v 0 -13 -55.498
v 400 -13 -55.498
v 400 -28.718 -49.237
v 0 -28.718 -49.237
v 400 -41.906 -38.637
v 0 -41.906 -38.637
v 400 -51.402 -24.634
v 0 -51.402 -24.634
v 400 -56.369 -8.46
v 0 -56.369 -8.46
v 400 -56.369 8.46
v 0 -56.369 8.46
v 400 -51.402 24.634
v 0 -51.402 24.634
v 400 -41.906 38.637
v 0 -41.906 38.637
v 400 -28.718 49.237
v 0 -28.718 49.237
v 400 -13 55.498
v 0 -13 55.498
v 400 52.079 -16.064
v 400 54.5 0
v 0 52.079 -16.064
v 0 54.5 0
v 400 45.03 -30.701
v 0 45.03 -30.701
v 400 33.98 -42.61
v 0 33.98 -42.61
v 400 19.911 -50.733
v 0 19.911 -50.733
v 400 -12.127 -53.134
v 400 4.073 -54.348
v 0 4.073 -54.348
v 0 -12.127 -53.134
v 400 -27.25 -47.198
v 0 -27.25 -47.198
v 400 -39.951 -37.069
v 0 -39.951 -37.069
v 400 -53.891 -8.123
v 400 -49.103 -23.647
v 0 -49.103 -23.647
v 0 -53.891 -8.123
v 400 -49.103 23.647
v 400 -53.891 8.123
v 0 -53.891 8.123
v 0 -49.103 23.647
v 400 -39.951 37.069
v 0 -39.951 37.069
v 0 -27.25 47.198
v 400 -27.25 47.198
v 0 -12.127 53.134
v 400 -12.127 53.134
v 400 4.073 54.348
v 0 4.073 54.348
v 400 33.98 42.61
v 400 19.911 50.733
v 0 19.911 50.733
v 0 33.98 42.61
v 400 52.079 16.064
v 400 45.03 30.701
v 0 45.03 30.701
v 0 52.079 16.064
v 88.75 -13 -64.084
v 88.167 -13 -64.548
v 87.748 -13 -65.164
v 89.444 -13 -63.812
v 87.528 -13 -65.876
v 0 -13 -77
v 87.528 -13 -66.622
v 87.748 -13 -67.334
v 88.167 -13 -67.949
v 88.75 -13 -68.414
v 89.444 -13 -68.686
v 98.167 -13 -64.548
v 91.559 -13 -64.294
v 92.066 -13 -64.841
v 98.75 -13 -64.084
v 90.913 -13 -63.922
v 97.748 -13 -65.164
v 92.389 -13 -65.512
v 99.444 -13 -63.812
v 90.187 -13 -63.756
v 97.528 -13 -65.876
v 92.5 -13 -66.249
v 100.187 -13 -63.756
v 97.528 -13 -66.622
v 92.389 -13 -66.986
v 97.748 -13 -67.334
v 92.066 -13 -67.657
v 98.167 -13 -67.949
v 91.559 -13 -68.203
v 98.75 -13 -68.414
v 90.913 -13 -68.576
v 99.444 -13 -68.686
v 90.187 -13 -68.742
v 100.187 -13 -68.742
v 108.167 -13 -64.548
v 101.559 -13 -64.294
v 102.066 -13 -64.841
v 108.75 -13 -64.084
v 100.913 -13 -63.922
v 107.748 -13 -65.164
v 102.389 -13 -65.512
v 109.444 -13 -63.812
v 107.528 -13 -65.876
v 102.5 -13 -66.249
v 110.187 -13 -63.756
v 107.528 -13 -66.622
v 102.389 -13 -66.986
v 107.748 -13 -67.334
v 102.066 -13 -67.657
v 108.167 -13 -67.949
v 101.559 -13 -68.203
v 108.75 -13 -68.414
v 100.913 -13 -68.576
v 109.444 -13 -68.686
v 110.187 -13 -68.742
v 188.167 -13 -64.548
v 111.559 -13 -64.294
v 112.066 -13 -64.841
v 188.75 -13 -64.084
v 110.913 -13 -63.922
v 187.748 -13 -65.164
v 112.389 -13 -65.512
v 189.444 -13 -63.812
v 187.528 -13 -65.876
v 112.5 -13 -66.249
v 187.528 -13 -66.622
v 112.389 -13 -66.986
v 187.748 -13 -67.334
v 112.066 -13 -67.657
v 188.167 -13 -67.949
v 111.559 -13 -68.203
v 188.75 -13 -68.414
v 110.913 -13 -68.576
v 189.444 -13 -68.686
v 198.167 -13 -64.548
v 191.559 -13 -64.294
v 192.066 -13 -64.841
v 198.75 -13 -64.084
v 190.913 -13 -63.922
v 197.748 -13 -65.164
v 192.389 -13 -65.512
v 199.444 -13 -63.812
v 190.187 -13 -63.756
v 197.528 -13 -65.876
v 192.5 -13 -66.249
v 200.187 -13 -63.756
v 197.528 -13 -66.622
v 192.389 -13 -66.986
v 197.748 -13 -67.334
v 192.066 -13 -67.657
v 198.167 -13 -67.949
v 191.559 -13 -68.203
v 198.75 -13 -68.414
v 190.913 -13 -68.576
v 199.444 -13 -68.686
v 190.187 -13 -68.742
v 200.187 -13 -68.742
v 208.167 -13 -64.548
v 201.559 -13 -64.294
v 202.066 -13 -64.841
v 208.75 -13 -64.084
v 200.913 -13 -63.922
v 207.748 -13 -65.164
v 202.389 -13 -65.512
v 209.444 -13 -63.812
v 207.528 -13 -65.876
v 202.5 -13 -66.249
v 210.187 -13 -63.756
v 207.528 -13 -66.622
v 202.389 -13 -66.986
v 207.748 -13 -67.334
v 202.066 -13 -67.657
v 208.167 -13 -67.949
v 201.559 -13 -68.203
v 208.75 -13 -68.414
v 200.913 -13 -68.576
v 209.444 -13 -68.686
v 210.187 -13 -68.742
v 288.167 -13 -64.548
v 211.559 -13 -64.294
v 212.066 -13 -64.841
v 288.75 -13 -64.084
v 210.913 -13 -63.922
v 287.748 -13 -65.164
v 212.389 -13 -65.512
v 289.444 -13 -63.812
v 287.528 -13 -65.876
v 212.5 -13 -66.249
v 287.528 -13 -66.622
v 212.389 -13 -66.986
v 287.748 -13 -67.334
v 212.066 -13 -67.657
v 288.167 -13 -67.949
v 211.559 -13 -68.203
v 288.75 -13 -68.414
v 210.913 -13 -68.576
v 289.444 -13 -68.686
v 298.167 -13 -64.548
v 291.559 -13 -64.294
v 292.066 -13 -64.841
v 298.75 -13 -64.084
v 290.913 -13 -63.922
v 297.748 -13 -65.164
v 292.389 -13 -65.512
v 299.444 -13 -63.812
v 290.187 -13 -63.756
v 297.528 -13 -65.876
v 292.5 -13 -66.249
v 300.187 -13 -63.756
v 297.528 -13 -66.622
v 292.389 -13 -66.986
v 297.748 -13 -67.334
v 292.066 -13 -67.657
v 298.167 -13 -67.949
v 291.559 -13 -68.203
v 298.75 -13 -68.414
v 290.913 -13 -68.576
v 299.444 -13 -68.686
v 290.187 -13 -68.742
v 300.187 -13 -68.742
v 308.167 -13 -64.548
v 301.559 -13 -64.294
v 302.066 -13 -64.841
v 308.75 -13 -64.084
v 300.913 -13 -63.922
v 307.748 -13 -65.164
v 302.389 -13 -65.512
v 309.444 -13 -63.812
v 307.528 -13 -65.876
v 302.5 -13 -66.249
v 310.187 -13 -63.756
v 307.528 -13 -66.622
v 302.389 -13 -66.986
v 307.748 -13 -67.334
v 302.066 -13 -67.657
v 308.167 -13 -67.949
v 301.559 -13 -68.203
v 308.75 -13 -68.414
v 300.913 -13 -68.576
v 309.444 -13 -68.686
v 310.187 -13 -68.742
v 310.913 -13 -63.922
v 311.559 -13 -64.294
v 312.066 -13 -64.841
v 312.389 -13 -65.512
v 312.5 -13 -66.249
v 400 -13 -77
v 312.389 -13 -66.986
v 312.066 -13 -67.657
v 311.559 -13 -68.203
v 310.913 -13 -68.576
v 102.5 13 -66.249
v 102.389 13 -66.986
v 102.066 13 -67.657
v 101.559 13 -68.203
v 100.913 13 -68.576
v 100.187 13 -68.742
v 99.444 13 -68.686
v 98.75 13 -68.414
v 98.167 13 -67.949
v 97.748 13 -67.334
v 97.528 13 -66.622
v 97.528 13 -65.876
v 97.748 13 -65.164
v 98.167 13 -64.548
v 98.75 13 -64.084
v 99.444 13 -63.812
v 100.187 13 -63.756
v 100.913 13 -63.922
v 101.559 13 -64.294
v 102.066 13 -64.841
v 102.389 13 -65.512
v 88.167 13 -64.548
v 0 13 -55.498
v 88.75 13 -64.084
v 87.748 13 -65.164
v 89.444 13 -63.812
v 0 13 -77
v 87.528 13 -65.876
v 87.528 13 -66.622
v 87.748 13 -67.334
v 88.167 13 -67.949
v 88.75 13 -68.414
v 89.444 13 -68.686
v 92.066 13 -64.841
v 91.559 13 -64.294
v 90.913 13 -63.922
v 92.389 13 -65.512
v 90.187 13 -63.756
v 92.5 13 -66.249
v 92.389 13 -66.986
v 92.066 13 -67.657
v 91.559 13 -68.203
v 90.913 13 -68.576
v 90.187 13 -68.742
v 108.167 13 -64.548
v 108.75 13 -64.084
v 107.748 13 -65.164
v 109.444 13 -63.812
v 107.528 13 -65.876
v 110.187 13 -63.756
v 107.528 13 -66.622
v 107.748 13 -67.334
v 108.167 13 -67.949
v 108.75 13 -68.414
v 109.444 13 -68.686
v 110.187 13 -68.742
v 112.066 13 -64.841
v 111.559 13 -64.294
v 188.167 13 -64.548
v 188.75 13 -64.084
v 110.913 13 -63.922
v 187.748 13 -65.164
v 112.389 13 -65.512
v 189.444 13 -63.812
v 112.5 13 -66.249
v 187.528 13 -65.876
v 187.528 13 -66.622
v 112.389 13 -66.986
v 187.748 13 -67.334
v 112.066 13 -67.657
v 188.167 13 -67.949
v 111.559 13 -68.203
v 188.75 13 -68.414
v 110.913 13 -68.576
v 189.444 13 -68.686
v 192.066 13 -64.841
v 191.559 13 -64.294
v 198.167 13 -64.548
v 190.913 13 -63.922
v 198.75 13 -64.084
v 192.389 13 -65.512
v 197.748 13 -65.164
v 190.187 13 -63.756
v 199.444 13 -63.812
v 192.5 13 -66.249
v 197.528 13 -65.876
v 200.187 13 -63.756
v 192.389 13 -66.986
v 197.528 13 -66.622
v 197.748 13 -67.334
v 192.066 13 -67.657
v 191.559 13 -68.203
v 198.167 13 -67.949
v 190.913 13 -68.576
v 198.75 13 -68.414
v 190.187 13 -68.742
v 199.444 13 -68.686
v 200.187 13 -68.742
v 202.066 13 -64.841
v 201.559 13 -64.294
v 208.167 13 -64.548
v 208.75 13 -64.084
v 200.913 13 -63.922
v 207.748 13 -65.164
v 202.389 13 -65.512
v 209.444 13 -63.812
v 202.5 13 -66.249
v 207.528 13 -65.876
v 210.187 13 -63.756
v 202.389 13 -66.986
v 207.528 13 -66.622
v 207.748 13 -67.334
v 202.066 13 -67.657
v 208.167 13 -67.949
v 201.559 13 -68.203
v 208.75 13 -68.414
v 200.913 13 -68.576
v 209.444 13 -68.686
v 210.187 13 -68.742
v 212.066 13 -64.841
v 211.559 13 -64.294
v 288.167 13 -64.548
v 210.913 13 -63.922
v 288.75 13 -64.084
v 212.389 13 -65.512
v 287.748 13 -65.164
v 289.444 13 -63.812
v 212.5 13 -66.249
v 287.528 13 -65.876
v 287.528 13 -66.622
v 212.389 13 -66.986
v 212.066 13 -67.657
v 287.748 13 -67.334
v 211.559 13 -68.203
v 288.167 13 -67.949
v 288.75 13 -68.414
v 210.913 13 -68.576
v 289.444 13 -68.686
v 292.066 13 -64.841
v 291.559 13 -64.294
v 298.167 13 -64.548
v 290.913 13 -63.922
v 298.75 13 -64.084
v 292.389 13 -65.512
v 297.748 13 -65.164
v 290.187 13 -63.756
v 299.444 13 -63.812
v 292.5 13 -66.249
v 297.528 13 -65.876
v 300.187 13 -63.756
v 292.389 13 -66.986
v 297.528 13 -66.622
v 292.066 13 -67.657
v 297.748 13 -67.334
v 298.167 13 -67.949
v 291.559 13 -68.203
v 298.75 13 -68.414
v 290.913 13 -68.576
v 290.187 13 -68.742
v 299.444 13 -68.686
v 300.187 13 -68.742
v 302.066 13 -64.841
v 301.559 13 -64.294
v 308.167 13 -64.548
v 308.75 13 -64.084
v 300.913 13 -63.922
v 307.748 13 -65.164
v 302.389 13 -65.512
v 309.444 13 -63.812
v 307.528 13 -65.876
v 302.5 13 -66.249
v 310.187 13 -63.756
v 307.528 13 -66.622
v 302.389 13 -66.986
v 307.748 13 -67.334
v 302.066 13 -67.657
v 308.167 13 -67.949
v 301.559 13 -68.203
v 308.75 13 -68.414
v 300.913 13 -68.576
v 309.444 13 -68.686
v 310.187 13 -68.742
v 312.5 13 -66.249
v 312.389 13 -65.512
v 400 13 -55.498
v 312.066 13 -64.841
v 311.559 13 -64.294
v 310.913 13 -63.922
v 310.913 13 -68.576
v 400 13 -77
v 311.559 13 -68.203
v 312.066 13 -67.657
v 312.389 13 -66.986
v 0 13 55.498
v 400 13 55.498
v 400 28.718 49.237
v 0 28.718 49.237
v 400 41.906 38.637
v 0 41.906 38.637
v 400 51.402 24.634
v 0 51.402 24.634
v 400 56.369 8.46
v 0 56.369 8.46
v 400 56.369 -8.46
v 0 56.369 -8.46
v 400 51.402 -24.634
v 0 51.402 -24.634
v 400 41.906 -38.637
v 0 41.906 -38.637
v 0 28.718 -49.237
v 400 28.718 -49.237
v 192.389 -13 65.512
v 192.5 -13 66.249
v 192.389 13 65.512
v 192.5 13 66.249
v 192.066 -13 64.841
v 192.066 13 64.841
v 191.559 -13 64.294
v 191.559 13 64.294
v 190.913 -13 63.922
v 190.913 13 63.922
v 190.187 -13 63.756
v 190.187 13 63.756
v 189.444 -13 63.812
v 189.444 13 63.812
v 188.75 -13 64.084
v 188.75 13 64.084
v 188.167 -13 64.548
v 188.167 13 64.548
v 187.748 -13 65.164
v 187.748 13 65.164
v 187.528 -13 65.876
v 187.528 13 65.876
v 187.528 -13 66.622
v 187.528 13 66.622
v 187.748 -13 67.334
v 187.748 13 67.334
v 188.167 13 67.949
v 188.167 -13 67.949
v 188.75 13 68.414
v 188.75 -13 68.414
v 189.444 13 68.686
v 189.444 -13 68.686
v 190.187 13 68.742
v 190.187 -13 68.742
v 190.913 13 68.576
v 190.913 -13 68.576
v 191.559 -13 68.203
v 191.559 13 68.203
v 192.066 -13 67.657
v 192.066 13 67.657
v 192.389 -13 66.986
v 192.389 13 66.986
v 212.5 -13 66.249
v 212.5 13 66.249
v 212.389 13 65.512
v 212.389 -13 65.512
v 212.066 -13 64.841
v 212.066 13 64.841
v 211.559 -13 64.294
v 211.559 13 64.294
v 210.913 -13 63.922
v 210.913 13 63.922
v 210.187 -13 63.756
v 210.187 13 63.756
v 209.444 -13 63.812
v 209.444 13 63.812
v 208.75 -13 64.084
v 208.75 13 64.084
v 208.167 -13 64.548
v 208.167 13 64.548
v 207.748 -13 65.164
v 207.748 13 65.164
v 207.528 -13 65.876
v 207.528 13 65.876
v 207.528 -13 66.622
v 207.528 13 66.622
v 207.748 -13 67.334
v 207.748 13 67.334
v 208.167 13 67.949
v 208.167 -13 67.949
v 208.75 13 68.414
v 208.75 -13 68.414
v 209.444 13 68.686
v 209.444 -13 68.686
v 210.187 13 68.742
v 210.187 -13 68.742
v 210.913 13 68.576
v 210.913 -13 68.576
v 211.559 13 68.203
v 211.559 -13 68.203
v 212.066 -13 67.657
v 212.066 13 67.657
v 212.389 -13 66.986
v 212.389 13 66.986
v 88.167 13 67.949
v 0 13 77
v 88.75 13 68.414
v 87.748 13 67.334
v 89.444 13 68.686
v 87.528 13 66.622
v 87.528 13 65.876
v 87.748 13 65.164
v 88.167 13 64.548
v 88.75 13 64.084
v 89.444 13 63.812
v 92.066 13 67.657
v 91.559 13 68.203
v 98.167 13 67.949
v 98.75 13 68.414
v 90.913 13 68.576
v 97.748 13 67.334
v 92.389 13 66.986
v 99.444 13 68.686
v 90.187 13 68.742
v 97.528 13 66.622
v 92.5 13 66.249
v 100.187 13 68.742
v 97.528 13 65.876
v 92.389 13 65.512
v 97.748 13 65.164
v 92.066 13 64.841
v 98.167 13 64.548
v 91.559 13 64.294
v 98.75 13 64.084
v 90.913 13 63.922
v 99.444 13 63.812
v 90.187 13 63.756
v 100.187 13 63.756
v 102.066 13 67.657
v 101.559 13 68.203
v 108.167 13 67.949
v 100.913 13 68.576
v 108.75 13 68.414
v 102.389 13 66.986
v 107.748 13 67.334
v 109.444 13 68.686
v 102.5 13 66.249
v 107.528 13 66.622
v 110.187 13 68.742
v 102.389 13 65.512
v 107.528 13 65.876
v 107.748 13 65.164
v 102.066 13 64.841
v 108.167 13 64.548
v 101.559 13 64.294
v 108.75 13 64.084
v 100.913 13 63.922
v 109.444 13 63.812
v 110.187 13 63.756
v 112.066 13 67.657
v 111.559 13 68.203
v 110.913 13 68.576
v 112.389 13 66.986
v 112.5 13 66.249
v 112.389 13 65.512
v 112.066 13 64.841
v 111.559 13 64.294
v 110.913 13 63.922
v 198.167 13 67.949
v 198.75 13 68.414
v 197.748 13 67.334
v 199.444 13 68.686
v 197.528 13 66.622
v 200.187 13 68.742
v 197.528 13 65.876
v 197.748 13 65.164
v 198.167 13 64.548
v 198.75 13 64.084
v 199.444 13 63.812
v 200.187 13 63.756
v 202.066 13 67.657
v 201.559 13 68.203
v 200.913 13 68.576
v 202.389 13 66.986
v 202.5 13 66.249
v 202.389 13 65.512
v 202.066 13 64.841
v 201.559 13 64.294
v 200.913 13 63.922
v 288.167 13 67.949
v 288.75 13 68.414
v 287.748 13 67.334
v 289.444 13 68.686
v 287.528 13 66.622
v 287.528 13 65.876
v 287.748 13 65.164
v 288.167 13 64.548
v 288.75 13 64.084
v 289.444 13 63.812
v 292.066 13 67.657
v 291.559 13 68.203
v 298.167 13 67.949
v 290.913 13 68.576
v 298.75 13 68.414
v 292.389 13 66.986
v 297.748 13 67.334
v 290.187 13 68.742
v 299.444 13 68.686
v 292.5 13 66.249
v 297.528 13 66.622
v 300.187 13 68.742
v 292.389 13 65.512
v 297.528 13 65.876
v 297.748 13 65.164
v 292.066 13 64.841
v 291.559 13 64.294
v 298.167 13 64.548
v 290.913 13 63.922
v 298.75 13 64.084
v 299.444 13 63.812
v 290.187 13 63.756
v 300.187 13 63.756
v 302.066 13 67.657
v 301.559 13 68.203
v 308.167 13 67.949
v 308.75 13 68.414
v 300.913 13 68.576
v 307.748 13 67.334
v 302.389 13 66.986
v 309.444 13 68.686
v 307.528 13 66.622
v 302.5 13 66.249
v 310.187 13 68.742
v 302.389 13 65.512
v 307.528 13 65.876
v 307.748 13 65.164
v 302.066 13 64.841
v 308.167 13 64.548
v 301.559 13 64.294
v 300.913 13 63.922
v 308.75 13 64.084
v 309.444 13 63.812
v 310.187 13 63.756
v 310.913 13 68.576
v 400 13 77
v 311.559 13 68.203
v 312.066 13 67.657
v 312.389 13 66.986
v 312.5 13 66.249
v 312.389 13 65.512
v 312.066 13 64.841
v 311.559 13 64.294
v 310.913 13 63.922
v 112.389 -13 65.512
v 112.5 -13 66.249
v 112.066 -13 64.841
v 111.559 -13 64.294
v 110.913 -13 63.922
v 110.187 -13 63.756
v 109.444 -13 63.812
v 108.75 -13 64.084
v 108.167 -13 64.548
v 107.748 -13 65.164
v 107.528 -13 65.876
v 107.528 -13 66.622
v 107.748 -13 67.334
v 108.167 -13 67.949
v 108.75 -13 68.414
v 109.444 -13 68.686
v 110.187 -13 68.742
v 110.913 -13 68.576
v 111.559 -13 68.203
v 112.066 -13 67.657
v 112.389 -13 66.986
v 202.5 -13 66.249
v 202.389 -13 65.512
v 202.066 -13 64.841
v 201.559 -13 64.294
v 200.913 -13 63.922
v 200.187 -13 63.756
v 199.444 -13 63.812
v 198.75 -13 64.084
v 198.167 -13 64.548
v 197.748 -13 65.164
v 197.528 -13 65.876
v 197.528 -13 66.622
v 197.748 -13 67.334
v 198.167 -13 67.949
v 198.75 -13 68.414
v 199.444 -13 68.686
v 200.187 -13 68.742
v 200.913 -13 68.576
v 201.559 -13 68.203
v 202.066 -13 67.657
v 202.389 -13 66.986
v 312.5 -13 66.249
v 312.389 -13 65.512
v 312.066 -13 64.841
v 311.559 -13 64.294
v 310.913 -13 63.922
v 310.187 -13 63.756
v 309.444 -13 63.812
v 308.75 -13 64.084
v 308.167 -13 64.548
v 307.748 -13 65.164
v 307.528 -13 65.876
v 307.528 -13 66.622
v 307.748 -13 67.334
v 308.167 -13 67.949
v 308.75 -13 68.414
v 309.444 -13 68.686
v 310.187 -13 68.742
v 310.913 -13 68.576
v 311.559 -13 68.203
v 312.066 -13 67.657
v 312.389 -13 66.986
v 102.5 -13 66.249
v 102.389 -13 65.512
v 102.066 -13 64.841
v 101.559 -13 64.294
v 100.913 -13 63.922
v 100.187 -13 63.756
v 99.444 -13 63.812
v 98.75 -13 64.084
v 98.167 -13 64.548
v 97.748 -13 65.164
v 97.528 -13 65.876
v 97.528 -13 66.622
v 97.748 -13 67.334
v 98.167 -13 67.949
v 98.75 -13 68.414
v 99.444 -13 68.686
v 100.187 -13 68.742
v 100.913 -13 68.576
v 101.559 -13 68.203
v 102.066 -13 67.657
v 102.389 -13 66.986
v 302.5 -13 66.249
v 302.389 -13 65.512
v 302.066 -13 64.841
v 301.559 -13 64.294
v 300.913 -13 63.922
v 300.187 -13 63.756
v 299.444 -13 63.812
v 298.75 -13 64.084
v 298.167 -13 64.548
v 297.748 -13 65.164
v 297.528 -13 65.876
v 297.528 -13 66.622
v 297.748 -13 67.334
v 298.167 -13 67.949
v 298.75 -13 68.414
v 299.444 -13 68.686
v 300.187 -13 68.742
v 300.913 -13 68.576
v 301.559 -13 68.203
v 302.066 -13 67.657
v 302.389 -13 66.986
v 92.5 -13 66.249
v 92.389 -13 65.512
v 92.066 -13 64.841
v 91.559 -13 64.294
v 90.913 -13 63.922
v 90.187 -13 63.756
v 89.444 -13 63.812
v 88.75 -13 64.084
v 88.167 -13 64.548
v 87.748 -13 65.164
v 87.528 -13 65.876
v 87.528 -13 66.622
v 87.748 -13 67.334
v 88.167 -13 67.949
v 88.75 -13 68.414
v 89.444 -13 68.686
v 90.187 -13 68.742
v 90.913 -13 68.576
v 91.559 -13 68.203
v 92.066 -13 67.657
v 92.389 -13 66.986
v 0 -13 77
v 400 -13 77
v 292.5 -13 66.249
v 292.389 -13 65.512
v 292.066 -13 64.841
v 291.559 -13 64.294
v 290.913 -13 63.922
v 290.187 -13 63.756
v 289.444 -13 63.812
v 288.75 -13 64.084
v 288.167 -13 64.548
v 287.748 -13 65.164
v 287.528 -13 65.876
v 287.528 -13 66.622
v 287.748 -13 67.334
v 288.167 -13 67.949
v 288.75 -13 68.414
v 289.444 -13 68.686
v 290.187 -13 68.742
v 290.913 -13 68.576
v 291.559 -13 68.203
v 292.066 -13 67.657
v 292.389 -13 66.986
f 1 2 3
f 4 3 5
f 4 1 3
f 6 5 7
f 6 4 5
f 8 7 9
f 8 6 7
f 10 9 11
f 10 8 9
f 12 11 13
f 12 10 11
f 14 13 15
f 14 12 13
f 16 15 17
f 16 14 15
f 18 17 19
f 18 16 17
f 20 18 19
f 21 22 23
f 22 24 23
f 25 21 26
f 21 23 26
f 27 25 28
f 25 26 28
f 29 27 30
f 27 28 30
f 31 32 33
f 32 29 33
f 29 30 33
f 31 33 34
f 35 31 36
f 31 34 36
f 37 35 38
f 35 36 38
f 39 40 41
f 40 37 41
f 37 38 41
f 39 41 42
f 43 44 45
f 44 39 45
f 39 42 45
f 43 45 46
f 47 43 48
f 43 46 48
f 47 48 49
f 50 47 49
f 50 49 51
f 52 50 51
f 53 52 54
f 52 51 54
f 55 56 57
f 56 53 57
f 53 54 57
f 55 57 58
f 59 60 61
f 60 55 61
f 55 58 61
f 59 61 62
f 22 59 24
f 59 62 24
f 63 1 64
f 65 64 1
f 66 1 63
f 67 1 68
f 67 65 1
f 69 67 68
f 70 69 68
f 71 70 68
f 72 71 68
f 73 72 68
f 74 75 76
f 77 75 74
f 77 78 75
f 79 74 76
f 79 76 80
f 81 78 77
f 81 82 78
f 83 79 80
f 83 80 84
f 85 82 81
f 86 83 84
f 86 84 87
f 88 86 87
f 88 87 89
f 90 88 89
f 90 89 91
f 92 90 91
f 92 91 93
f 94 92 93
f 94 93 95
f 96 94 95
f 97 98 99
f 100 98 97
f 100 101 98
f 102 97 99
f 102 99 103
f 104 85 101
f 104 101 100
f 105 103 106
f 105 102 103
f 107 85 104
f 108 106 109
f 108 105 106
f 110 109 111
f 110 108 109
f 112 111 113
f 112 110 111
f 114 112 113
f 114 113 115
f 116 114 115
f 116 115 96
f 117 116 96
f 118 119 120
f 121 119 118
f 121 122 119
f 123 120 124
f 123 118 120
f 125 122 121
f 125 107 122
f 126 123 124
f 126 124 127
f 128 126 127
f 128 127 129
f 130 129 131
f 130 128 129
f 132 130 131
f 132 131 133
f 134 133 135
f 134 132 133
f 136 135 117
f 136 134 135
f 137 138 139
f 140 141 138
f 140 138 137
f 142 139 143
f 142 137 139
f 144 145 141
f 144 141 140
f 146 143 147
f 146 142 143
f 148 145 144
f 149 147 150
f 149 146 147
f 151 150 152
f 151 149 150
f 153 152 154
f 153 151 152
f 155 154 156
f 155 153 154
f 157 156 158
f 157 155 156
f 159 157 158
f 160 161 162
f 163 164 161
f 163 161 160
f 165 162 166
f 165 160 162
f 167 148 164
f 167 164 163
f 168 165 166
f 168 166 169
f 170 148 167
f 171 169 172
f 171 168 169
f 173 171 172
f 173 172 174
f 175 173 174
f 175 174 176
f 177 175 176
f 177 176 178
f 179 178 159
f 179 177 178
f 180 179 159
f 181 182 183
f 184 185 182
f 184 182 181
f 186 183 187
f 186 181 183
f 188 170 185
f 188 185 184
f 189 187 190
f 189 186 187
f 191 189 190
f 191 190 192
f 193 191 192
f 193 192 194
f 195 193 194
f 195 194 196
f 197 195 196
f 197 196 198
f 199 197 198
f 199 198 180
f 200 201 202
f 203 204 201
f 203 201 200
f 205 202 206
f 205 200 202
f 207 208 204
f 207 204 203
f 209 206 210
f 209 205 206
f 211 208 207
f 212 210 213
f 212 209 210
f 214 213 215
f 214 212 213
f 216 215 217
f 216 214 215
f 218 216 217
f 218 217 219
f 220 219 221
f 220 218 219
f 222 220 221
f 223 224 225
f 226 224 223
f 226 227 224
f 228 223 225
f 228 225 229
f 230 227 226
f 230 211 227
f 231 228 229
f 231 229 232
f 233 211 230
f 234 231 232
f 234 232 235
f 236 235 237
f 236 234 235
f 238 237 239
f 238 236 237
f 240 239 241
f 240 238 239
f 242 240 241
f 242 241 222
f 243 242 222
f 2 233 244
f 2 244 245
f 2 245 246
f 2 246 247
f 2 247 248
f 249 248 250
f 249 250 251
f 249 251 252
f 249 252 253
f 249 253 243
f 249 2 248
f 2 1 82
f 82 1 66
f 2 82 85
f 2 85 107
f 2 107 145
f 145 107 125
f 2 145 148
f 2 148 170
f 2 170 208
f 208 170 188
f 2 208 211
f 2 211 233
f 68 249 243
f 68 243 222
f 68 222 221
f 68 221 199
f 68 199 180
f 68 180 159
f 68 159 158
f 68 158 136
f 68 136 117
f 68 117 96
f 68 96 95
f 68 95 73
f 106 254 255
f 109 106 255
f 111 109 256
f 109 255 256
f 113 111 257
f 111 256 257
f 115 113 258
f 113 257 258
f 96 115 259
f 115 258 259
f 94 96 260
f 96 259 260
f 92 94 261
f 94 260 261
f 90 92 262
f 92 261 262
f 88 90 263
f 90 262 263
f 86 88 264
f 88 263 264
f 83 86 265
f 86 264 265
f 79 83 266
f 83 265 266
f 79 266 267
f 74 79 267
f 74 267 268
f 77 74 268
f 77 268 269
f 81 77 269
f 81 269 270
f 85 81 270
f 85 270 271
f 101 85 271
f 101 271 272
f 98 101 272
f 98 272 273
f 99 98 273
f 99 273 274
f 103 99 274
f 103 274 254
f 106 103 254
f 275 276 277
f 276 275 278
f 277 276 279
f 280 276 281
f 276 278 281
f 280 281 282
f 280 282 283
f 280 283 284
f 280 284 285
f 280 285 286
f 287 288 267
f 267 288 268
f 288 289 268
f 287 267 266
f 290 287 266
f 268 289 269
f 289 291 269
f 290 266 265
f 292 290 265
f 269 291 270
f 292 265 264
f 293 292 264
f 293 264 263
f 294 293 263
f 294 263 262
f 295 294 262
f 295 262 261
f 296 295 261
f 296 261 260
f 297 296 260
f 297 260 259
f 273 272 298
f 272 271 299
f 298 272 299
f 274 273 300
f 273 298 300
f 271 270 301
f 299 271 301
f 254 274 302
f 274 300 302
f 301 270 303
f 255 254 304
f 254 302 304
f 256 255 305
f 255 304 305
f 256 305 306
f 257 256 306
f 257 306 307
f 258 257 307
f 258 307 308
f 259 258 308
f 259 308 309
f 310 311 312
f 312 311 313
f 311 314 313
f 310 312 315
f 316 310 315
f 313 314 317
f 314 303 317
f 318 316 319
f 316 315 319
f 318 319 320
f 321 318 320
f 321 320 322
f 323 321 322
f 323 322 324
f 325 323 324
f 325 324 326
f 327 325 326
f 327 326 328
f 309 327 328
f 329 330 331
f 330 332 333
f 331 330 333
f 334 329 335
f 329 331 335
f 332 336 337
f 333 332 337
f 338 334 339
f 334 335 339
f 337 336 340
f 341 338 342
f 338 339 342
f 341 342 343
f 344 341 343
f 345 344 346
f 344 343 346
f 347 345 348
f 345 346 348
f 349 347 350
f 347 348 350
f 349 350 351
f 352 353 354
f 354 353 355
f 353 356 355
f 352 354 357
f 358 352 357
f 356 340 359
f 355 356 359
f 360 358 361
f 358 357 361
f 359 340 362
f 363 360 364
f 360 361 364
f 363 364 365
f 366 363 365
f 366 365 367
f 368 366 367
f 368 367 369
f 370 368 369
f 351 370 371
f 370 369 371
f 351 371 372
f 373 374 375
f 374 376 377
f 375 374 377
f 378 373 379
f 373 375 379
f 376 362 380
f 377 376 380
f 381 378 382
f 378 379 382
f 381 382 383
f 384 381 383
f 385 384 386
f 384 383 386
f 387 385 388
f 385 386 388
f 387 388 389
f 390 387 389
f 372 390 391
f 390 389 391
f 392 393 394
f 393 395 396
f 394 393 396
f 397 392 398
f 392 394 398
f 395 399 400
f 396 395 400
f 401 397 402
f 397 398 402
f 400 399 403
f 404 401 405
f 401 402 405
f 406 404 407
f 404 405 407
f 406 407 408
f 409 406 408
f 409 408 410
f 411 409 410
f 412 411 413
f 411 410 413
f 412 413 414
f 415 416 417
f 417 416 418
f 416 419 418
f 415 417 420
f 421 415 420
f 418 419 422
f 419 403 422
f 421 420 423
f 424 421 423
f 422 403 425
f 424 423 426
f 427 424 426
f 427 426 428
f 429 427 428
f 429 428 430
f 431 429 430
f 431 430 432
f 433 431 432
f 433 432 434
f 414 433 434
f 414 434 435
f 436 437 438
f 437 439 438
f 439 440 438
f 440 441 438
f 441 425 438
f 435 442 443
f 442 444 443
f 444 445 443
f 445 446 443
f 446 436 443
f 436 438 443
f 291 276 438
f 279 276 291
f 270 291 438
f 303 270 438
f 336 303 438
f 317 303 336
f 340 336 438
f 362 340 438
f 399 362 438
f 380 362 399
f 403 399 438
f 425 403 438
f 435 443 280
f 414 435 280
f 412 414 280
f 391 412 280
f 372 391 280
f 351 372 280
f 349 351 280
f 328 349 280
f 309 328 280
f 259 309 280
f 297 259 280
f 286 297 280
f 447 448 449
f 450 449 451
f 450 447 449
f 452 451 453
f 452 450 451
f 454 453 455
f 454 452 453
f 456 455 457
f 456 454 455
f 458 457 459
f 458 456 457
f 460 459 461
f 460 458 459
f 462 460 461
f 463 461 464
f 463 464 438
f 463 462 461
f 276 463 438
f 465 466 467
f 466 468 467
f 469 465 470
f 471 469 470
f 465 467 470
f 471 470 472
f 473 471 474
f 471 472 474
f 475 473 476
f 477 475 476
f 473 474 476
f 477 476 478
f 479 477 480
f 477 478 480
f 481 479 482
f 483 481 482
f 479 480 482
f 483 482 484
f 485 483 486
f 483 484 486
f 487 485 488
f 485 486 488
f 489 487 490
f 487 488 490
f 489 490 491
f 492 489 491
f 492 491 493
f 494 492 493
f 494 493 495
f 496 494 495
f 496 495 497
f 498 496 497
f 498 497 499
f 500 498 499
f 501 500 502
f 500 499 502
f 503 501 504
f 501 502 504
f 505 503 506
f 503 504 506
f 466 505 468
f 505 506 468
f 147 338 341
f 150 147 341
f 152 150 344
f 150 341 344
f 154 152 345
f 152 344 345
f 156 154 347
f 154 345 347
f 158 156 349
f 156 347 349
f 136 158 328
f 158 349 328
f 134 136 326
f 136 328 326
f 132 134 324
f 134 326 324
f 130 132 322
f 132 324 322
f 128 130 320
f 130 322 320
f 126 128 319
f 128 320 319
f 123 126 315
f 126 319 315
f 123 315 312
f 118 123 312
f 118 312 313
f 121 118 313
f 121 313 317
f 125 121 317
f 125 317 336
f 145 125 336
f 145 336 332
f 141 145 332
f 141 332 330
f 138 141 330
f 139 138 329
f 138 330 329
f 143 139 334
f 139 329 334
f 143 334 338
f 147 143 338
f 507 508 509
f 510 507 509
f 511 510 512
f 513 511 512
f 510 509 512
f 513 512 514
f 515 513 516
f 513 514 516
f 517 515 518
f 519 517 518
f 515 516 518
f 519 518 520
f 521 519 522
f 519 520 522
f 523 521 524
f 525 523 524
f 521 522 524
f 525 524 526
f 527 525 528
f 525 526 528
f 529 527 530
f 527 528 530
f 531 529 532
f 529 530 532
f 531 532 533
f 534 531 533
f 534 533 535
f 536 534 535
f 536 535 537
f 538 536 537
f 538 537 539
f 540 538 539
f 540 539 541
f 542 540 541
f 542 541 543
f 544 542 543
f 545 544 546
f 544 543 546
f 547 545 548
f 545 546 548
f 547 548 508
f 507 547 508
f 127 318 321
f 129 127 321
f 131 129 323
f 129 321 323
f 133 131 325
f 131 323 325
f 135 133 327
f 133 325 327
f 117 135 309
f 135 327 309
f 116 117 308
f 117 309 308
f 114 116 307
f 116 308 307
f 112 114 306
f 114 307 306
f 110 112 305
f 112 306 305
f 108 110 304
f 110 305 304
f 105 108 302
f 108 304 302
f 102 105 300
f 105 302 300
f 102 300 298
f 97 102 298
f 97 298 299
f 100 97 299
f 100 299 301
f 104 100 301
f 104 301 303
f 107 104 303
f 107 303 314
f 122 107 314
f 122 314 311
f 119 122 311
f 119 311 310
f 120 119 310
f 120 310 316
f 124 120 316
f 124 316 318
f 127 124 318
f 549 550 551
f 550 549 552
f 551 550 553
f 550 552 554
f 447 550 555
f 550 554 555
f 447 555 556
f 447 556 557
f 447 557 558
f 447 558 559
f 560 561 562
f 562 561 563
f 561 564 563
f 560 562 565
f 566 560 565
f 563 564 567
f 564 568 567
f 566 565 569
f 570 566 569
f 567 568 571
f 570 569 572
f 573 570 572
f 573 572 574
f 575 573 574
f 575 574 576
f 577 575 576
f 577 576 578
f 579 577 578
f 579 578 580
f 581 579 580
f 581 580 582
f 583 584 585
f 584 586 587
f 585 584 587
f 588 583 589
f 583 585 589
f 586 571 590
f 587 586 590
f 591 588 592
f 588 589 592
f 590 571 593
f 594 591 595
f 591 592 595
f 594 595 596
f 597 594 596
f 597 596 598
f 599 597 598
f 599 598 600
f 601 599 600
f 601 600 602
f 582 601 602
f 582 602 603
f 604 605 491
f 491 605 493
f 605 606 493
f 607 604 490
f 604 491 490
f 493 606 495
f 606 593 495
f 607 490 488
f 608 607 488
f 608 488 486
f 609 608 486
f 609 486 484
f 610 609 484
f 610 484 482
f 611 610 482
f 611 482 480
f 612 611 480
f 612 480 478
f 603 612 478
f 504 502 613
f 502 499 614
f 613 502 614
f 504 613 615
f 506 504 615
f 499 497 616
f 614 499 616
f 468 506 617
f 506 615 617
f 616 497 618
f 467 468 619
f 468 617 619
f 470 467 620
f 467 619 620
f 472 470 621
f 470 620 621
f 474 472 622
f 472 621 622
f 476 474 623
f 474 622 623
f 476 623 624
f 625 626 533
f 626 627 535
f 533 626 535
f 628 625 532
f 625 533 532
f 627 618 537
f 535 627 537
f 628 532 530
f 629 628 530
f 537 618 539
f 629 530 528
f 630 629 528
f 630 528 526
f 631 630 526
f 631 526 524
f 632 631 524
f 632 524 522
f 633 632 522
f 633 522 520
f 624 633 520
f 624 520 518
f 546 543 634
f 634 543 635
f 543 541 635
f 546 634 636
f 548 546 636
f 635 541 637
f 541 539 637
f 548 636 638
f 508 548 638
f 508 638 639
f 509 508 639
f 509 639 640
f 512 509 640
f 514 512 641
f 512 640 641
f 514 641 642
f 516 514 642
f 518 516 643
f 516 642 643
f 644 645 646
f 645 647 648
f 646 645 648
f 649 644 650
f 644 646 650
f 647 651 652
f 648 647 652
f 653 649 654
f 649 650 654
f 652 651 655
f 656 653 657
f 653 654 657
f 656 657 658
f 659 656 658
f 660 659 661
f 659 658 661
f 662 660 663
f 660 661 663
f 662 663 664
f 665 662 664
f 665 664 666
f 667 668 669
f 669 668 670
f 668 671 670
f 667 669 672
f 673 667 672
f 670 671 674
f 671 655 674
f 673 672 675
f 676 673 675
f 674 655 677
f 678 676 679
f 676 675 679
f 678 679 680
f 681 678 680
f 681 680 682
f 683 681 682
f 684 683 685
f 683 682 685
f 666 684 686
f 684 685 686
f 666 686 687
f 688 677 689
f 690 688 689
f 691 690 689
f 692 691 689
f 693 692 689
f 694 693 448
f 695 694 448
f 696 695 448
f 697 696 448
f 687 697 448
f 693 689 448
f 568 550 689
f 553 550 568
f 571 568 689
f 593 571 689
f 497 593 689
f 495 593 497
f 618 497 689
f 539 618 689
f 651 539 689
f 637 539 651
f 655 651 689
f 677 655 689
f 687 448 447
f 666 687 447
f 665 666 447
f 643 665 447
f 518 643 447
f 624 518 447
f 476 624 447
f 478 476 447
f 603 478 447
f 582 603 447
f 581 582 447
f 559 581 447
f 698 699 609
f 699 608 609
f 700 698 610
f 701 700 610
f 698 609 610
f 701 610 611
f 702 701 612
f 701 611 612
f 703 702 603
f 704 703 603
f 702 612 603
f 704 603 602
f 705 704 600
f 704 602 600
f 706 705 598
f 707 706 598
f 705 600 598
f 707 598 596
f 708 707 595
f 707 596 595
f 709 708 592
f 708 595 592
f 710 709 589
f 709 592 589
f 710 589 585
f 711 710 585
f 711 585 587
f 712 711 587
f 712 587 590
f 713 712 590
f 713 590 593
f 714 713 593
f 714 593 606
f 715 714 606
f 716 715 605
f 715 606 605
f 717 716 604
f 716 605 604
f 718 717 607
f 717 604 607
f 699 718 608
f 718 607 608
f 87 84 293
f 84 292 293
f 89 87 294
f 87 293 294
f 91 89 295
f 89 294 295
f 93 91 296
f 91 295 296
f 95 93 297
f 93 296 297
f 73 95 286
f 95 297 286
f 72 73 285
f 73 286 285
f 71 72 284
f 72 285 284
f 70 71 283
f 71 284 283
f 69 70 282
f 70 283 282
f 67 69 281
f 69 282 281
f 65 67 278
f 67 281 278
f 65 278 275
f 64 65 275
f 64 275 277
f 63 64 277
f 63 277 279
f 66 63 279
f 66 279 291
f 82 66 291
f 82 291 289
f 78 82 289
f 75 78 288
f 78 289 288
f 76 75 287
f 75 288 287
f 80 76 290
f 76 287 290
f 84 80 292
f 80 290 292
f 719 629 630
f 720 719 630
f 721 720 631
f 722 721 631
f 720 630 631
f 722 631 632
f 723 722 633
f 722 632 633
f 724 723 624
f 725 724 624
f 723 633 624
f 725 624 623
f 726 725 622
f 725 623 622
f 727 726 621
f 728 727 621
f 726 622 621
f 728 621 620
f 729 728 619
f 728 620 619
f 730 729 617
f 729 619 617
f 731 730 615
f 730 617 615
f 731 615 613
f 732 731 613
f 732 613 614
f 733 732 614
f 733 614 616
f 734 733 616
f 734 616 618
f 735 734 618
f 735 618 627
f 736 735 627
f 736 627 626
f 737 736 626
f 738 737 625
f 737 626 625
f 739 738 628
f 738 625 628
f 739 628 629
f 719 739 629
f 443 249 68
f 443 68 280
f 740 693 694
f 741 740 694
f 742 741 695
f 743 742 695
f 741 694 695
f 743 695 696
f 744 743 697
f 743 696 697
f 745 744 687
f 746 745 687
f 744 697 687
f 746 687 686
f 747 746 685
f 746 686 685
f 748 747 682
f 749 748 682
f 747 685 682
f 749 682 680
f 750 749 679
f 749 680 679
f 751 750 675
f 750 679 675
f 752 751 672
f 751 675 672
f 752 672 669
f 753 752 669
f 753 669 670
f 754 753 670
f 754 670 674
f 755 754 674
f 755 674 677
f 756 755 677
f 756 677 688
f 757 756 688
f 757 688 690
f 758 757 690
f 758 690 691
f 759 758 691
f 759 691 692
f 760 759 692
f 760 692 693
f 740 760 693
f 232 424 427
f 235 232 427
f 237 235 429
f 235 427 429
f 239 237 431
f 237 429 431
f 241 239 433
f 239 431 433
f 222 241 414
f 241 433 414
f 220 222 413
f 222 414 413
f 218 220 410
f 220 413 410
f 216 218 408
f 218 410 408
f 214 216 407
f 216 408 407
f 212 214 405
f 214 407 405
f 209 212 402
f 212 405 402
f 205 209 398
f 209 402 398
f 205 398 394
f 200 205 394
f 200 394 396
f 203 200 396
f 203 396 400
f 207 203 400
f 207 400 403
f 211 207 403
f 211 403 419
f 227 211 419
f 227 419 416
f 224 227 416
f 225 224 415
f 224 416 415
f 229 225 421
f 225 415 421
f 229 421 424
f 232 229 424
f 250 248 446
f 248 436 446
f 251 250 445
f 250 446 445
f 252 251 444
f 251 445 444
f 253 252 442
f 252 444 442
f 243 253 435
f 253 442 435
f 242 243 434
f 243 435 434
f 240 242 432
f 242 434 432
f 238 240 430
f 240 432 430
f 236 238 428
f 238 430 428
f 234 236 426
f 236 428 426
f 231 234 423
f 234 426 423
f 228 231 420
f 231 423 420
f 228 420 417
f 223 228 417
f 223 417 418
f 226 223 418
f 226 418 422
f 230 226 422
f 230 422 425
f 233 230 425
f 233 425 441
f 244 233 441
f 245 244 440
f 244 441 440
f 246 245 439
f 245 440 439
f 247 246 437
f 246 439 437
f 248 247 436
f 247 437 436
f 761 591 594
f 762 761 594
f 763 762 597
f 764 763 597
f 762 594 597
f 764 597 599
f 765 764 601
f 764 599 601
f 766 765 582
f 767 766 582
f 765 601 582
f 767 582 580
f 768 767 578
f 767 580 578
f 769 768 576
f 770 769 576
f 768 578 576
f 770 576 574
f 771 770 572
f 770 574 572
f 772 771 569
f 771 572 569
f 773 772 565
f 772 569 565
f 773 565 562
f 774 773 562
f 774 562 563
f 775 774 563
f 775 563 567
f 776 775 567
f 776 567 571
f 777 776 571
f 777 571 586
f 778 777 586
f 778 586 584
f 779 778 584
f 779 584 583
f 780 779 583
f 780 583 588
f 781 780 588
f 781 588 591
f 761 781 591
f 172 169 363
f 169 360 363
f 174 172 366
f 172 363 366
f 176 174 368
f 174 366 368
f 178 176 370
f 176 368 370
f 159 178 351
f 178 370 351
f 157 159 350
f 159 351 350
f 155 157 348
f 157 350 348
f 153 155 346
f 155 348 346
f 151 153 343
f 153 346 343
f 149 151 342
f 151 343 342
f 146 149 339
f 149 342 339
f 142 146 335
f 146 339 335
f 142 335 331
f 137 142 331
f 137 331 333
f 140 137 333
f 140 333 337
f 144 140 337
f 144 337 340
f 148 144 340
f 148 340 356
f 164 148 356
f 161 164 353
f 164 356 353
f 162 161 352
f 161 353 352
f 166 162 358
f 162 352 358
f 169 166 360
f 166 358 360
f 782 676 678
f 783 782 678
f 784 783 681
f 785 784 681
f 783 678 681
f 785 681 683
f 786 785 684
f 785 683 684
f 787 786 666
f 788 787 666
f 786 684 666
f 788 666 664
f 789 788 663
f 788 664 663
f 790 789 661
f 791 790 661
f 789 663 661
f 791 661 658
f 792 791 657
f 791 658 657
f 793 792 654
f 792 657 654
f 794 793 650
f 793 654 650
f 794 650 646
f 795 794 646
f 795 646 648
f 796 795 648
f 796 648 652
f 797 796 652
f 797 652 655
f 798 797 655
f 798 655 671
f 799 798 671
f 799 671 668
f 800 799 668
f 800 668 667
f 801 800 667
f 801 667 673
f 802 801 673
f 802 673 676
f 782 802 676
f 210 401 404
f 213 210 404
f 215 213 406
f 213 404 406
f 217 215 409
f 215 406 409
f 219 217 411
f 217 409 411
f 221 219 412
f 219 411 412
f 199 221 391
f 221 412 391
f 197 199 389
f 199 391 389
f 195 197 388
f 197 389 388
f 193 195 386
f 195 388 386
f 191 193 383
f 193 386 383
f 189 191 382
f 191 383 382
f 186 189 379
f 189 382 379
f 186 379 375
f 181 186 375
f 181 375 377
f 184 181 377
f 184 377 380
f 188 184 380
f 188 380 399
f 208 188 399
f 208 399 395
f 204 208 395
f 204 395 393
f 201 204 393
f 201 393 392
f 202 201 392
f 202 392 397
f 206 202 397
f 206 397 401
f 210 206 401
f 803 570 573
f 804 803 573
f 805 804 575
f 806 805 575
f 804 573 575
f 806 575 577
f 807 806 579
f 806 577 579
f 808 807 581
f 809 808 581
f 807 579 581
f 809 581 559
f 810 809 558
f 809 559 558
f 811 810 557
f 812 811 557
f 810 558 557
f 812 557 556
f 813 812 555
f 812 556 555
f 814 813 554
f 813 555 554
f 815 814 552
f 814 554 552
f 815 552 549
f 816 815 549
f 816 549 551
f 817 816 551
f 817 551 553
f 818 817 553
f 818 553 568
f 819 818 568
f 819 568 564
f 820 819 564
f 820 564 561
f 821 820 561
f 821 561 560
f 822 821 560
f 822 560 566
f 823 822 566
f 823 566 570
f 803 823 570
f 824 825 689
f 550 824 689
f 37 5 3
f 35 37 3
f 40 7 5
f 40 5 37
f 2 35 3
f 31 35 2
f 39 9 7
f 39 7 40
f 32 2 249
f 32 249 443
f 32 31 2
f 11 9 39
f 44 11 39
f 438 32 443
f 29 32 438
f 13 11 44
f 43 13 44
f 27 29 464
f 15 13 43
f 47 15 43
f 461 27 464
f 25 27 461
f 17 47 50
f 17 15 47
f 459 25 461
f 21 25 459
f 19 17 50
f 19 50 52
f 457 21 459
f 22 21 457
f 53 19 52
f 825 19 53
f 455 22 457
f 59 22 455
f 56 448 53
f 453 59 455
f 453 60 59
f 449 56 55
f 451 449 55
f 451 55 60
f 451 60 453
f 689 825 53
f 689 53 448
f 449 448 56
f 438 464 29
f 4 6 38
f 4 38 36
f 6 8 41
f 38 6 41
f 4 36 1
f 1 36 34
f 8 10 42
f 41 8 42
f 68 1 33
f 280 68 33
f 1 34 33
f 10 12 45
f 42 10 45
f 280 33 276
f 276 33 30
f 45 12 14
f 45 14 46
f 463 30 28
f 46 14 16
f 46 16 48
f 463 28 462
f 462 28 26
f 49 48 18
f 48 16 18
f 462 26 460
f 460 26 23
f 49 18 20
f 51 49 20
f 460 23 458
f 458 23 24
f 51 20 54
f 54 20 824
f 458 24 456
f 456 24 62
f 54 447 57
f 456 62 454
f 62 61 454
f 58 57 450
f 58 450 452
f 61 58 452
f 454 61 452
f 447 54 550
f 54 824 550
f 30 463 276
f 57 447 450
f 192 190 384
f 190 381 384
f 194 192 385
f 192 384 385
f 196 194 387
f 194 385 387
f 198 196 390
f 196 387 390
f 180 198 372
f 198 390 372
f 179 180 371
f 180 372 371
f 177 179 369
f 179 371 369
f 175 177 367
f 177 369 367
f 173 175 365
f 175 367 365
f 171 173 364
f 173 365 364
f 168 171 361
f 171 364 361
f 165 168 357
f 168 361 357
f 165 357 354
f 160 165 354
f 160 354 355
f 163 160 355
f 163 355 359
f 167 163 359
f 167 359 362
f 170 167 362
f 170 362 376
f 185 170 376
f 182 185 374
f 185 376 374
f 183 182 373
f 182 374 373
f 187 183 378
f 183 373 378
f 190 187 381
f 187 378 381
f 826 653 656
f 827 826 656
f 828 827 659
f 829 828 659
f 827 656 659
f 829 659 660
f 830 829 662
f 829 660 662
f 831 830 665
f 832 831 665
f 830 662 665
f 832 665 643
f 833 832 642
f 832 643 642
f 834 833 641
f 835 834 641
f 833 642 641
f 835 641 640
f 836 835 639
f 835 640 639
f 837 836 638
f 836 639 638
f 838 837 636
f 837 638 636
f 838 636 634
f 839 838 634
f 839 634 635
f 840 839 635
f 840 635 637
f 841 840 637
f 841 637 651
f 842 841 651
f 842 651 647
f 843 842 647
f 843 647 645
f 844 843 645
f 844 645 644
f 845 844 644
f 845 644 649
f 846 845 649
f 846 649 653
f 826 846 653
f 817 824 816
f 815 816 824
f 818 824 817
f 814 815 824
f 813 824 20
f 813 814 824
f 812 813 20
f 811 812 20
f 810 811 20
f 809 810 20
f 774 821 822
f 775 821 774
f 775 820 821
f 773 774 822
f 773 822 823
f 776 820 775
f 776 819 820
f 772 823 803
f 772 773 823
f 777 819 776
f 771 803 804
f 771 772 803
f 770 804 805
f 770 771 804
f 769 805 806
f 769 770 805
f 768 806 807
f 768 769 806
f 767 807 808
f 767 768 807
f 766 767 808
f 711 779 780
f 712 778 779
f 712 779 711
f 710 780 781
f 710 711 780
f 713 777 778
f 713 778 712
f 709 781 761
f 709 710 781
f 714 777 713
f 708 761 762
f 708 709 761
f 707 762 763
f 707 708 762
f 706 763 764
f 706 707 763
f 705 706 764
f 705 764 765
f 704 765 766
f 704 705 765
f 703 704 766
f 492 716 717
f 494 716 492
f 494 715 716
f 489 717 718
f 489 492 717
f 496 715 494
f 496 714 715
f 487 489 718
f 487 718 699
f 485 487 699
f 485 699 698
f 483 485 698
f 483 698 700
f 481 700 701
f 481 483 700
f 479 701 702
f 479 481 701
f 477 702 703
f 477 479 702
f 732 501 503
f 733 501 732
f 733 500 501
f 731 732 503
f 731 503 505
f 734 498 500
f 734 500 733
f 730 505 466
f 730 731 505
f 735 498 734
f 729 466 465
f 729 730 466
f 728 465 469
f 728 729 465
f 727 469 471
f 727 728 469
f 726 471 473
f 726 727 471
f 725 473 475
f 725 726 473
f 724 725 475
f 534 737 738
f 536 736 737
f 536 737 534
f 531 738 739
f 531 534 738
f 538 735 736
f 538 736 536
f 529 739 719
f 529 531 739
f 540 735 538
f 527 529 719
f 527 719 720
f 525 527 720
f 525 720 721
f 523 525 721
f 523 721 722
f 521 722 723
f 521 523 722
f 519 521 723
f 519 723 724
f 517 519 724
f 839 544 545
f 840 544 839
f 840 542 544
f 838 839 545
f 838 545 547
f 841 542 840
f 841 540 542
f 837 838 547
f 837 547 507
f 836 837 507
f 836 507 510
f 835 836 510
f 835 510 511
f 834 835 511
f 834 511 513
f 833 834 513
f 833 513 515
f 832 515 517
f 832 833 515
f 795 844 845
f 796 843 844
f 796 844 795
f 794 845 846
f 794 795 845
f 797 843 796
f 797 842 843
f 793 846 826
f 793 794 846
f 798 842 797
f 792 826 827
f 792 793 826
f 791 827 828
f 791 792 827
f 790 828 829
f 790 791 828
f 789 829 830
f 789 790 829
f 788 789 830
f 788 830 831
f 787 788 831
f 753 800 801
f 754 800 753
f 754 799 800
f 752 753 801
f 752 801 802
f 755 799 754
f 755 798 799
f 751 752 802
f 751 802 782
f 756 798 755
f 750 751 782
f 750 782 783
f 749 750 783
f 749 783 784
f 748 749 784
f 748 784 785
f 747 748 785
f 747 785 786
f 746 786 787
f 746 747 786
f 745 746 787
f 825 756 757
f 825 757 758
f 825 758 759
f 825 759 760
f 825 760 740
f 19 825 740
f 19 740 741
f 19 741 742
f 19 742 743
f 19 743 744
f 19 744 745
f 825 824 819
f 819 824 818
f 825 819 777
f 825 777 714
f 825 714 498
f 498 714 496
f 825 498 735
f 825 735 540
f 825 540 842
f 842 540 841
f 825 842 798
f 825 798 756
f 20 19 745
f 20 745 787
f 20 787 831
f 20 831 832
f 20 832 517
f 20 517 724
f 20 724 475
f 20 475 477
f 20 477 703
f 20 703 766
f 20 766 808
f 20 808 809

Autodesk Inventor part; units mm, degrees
ref_plane "YZ Plane" through (0, 0, 0) normal (1, 0, 0) x (0, 1, 0)
ref_plane "XZ Plane" through (0, 0, 0) normal (0, 1, 0) x (-1, 0, 0)
sketch "Sketch1" plane through (0, 0, 0) normal (1, 0, 0) x (0, 1, 0)
  circle A0 centre (0, 0) radius 54.5
  circle A1 centre (0, 0) radius 57
  dimension "d0" = 109
  dimension "d1" = 114
extrude "Extrusion1" add sketch "Sketch1" along normal blind 400
sketch "Sketch2" plane through (400, 0, 0) normal (1, 0, 0) x (0, 0, -1)
  circle A0 centre (0, 0) radius 57 projected
  line L0 (-77, 0) -> (-77, 13)
  line L1 (-77, 13) -> (-77, -13)
  line L2 (-77, -13) -> (-55.4977, -13)
  line L3 (-77, 13) -> (-55.4977, 13)
  line L4 (-55.4977, 13) -> (-77, 13)
  line L5 (-77, 13) -> (-77, -13)
  line L6 (-77, -13) -> (-55.4977, -13)
  arc A1 (-55.4977, 13) -> (-55.4977, -13) centre (0, 0) ccw
  dimension "d5" = 13
  dimension "d6" = 26
extrude "Extrusion2" add sketch "Sketch2" against normal blind 400 contours A0 L2 L1 L0 L3
ref_plane "Work Plane1" through (0, 0, 0) normal (0, 0, 1) x (1, 0, 0)
mirror "Mirror1" about plane through (0, 0, 0) normal (0, 0, 1) of "Extrusion2"
sketch "Sketch3" plane through (400, 13, 77) normal (0, 1, 0) x (1, 0, 0)
  line L0 (-400, 21.5023) -> (-400, 0) projected
  line L1 (0, 0) -> (0, 21.5023) projected
  circle A0 centre (-200, 10.7511) radius 2.5
  circle A1 centre (-100, 10.7511) radius 2.5
  circle A2 centre (-300, 10.7511) radius 2.5
  circle A3 centre (-190, 10.7511) radius 2.5
  circle A4 centre (-210, 10.7511) radius 2.5
  circle A5 centre (-290, 10.7511) radius 2.5
  circle A6 centre (-310, 10.7511) radius 2.5
  circle A7 centre (-90, 10.7511) radius 2.5
  circle A8 centre (-110, 10.7511) radius 2.5
  point P0 (-400, 77)
extrude "Extrusion4" cut sketch "Sketch3" against normal blind 400
mirror "Mirror3" about plane through (0, 0, 0) normal (0, 0, 1) of "Extrusion4"
